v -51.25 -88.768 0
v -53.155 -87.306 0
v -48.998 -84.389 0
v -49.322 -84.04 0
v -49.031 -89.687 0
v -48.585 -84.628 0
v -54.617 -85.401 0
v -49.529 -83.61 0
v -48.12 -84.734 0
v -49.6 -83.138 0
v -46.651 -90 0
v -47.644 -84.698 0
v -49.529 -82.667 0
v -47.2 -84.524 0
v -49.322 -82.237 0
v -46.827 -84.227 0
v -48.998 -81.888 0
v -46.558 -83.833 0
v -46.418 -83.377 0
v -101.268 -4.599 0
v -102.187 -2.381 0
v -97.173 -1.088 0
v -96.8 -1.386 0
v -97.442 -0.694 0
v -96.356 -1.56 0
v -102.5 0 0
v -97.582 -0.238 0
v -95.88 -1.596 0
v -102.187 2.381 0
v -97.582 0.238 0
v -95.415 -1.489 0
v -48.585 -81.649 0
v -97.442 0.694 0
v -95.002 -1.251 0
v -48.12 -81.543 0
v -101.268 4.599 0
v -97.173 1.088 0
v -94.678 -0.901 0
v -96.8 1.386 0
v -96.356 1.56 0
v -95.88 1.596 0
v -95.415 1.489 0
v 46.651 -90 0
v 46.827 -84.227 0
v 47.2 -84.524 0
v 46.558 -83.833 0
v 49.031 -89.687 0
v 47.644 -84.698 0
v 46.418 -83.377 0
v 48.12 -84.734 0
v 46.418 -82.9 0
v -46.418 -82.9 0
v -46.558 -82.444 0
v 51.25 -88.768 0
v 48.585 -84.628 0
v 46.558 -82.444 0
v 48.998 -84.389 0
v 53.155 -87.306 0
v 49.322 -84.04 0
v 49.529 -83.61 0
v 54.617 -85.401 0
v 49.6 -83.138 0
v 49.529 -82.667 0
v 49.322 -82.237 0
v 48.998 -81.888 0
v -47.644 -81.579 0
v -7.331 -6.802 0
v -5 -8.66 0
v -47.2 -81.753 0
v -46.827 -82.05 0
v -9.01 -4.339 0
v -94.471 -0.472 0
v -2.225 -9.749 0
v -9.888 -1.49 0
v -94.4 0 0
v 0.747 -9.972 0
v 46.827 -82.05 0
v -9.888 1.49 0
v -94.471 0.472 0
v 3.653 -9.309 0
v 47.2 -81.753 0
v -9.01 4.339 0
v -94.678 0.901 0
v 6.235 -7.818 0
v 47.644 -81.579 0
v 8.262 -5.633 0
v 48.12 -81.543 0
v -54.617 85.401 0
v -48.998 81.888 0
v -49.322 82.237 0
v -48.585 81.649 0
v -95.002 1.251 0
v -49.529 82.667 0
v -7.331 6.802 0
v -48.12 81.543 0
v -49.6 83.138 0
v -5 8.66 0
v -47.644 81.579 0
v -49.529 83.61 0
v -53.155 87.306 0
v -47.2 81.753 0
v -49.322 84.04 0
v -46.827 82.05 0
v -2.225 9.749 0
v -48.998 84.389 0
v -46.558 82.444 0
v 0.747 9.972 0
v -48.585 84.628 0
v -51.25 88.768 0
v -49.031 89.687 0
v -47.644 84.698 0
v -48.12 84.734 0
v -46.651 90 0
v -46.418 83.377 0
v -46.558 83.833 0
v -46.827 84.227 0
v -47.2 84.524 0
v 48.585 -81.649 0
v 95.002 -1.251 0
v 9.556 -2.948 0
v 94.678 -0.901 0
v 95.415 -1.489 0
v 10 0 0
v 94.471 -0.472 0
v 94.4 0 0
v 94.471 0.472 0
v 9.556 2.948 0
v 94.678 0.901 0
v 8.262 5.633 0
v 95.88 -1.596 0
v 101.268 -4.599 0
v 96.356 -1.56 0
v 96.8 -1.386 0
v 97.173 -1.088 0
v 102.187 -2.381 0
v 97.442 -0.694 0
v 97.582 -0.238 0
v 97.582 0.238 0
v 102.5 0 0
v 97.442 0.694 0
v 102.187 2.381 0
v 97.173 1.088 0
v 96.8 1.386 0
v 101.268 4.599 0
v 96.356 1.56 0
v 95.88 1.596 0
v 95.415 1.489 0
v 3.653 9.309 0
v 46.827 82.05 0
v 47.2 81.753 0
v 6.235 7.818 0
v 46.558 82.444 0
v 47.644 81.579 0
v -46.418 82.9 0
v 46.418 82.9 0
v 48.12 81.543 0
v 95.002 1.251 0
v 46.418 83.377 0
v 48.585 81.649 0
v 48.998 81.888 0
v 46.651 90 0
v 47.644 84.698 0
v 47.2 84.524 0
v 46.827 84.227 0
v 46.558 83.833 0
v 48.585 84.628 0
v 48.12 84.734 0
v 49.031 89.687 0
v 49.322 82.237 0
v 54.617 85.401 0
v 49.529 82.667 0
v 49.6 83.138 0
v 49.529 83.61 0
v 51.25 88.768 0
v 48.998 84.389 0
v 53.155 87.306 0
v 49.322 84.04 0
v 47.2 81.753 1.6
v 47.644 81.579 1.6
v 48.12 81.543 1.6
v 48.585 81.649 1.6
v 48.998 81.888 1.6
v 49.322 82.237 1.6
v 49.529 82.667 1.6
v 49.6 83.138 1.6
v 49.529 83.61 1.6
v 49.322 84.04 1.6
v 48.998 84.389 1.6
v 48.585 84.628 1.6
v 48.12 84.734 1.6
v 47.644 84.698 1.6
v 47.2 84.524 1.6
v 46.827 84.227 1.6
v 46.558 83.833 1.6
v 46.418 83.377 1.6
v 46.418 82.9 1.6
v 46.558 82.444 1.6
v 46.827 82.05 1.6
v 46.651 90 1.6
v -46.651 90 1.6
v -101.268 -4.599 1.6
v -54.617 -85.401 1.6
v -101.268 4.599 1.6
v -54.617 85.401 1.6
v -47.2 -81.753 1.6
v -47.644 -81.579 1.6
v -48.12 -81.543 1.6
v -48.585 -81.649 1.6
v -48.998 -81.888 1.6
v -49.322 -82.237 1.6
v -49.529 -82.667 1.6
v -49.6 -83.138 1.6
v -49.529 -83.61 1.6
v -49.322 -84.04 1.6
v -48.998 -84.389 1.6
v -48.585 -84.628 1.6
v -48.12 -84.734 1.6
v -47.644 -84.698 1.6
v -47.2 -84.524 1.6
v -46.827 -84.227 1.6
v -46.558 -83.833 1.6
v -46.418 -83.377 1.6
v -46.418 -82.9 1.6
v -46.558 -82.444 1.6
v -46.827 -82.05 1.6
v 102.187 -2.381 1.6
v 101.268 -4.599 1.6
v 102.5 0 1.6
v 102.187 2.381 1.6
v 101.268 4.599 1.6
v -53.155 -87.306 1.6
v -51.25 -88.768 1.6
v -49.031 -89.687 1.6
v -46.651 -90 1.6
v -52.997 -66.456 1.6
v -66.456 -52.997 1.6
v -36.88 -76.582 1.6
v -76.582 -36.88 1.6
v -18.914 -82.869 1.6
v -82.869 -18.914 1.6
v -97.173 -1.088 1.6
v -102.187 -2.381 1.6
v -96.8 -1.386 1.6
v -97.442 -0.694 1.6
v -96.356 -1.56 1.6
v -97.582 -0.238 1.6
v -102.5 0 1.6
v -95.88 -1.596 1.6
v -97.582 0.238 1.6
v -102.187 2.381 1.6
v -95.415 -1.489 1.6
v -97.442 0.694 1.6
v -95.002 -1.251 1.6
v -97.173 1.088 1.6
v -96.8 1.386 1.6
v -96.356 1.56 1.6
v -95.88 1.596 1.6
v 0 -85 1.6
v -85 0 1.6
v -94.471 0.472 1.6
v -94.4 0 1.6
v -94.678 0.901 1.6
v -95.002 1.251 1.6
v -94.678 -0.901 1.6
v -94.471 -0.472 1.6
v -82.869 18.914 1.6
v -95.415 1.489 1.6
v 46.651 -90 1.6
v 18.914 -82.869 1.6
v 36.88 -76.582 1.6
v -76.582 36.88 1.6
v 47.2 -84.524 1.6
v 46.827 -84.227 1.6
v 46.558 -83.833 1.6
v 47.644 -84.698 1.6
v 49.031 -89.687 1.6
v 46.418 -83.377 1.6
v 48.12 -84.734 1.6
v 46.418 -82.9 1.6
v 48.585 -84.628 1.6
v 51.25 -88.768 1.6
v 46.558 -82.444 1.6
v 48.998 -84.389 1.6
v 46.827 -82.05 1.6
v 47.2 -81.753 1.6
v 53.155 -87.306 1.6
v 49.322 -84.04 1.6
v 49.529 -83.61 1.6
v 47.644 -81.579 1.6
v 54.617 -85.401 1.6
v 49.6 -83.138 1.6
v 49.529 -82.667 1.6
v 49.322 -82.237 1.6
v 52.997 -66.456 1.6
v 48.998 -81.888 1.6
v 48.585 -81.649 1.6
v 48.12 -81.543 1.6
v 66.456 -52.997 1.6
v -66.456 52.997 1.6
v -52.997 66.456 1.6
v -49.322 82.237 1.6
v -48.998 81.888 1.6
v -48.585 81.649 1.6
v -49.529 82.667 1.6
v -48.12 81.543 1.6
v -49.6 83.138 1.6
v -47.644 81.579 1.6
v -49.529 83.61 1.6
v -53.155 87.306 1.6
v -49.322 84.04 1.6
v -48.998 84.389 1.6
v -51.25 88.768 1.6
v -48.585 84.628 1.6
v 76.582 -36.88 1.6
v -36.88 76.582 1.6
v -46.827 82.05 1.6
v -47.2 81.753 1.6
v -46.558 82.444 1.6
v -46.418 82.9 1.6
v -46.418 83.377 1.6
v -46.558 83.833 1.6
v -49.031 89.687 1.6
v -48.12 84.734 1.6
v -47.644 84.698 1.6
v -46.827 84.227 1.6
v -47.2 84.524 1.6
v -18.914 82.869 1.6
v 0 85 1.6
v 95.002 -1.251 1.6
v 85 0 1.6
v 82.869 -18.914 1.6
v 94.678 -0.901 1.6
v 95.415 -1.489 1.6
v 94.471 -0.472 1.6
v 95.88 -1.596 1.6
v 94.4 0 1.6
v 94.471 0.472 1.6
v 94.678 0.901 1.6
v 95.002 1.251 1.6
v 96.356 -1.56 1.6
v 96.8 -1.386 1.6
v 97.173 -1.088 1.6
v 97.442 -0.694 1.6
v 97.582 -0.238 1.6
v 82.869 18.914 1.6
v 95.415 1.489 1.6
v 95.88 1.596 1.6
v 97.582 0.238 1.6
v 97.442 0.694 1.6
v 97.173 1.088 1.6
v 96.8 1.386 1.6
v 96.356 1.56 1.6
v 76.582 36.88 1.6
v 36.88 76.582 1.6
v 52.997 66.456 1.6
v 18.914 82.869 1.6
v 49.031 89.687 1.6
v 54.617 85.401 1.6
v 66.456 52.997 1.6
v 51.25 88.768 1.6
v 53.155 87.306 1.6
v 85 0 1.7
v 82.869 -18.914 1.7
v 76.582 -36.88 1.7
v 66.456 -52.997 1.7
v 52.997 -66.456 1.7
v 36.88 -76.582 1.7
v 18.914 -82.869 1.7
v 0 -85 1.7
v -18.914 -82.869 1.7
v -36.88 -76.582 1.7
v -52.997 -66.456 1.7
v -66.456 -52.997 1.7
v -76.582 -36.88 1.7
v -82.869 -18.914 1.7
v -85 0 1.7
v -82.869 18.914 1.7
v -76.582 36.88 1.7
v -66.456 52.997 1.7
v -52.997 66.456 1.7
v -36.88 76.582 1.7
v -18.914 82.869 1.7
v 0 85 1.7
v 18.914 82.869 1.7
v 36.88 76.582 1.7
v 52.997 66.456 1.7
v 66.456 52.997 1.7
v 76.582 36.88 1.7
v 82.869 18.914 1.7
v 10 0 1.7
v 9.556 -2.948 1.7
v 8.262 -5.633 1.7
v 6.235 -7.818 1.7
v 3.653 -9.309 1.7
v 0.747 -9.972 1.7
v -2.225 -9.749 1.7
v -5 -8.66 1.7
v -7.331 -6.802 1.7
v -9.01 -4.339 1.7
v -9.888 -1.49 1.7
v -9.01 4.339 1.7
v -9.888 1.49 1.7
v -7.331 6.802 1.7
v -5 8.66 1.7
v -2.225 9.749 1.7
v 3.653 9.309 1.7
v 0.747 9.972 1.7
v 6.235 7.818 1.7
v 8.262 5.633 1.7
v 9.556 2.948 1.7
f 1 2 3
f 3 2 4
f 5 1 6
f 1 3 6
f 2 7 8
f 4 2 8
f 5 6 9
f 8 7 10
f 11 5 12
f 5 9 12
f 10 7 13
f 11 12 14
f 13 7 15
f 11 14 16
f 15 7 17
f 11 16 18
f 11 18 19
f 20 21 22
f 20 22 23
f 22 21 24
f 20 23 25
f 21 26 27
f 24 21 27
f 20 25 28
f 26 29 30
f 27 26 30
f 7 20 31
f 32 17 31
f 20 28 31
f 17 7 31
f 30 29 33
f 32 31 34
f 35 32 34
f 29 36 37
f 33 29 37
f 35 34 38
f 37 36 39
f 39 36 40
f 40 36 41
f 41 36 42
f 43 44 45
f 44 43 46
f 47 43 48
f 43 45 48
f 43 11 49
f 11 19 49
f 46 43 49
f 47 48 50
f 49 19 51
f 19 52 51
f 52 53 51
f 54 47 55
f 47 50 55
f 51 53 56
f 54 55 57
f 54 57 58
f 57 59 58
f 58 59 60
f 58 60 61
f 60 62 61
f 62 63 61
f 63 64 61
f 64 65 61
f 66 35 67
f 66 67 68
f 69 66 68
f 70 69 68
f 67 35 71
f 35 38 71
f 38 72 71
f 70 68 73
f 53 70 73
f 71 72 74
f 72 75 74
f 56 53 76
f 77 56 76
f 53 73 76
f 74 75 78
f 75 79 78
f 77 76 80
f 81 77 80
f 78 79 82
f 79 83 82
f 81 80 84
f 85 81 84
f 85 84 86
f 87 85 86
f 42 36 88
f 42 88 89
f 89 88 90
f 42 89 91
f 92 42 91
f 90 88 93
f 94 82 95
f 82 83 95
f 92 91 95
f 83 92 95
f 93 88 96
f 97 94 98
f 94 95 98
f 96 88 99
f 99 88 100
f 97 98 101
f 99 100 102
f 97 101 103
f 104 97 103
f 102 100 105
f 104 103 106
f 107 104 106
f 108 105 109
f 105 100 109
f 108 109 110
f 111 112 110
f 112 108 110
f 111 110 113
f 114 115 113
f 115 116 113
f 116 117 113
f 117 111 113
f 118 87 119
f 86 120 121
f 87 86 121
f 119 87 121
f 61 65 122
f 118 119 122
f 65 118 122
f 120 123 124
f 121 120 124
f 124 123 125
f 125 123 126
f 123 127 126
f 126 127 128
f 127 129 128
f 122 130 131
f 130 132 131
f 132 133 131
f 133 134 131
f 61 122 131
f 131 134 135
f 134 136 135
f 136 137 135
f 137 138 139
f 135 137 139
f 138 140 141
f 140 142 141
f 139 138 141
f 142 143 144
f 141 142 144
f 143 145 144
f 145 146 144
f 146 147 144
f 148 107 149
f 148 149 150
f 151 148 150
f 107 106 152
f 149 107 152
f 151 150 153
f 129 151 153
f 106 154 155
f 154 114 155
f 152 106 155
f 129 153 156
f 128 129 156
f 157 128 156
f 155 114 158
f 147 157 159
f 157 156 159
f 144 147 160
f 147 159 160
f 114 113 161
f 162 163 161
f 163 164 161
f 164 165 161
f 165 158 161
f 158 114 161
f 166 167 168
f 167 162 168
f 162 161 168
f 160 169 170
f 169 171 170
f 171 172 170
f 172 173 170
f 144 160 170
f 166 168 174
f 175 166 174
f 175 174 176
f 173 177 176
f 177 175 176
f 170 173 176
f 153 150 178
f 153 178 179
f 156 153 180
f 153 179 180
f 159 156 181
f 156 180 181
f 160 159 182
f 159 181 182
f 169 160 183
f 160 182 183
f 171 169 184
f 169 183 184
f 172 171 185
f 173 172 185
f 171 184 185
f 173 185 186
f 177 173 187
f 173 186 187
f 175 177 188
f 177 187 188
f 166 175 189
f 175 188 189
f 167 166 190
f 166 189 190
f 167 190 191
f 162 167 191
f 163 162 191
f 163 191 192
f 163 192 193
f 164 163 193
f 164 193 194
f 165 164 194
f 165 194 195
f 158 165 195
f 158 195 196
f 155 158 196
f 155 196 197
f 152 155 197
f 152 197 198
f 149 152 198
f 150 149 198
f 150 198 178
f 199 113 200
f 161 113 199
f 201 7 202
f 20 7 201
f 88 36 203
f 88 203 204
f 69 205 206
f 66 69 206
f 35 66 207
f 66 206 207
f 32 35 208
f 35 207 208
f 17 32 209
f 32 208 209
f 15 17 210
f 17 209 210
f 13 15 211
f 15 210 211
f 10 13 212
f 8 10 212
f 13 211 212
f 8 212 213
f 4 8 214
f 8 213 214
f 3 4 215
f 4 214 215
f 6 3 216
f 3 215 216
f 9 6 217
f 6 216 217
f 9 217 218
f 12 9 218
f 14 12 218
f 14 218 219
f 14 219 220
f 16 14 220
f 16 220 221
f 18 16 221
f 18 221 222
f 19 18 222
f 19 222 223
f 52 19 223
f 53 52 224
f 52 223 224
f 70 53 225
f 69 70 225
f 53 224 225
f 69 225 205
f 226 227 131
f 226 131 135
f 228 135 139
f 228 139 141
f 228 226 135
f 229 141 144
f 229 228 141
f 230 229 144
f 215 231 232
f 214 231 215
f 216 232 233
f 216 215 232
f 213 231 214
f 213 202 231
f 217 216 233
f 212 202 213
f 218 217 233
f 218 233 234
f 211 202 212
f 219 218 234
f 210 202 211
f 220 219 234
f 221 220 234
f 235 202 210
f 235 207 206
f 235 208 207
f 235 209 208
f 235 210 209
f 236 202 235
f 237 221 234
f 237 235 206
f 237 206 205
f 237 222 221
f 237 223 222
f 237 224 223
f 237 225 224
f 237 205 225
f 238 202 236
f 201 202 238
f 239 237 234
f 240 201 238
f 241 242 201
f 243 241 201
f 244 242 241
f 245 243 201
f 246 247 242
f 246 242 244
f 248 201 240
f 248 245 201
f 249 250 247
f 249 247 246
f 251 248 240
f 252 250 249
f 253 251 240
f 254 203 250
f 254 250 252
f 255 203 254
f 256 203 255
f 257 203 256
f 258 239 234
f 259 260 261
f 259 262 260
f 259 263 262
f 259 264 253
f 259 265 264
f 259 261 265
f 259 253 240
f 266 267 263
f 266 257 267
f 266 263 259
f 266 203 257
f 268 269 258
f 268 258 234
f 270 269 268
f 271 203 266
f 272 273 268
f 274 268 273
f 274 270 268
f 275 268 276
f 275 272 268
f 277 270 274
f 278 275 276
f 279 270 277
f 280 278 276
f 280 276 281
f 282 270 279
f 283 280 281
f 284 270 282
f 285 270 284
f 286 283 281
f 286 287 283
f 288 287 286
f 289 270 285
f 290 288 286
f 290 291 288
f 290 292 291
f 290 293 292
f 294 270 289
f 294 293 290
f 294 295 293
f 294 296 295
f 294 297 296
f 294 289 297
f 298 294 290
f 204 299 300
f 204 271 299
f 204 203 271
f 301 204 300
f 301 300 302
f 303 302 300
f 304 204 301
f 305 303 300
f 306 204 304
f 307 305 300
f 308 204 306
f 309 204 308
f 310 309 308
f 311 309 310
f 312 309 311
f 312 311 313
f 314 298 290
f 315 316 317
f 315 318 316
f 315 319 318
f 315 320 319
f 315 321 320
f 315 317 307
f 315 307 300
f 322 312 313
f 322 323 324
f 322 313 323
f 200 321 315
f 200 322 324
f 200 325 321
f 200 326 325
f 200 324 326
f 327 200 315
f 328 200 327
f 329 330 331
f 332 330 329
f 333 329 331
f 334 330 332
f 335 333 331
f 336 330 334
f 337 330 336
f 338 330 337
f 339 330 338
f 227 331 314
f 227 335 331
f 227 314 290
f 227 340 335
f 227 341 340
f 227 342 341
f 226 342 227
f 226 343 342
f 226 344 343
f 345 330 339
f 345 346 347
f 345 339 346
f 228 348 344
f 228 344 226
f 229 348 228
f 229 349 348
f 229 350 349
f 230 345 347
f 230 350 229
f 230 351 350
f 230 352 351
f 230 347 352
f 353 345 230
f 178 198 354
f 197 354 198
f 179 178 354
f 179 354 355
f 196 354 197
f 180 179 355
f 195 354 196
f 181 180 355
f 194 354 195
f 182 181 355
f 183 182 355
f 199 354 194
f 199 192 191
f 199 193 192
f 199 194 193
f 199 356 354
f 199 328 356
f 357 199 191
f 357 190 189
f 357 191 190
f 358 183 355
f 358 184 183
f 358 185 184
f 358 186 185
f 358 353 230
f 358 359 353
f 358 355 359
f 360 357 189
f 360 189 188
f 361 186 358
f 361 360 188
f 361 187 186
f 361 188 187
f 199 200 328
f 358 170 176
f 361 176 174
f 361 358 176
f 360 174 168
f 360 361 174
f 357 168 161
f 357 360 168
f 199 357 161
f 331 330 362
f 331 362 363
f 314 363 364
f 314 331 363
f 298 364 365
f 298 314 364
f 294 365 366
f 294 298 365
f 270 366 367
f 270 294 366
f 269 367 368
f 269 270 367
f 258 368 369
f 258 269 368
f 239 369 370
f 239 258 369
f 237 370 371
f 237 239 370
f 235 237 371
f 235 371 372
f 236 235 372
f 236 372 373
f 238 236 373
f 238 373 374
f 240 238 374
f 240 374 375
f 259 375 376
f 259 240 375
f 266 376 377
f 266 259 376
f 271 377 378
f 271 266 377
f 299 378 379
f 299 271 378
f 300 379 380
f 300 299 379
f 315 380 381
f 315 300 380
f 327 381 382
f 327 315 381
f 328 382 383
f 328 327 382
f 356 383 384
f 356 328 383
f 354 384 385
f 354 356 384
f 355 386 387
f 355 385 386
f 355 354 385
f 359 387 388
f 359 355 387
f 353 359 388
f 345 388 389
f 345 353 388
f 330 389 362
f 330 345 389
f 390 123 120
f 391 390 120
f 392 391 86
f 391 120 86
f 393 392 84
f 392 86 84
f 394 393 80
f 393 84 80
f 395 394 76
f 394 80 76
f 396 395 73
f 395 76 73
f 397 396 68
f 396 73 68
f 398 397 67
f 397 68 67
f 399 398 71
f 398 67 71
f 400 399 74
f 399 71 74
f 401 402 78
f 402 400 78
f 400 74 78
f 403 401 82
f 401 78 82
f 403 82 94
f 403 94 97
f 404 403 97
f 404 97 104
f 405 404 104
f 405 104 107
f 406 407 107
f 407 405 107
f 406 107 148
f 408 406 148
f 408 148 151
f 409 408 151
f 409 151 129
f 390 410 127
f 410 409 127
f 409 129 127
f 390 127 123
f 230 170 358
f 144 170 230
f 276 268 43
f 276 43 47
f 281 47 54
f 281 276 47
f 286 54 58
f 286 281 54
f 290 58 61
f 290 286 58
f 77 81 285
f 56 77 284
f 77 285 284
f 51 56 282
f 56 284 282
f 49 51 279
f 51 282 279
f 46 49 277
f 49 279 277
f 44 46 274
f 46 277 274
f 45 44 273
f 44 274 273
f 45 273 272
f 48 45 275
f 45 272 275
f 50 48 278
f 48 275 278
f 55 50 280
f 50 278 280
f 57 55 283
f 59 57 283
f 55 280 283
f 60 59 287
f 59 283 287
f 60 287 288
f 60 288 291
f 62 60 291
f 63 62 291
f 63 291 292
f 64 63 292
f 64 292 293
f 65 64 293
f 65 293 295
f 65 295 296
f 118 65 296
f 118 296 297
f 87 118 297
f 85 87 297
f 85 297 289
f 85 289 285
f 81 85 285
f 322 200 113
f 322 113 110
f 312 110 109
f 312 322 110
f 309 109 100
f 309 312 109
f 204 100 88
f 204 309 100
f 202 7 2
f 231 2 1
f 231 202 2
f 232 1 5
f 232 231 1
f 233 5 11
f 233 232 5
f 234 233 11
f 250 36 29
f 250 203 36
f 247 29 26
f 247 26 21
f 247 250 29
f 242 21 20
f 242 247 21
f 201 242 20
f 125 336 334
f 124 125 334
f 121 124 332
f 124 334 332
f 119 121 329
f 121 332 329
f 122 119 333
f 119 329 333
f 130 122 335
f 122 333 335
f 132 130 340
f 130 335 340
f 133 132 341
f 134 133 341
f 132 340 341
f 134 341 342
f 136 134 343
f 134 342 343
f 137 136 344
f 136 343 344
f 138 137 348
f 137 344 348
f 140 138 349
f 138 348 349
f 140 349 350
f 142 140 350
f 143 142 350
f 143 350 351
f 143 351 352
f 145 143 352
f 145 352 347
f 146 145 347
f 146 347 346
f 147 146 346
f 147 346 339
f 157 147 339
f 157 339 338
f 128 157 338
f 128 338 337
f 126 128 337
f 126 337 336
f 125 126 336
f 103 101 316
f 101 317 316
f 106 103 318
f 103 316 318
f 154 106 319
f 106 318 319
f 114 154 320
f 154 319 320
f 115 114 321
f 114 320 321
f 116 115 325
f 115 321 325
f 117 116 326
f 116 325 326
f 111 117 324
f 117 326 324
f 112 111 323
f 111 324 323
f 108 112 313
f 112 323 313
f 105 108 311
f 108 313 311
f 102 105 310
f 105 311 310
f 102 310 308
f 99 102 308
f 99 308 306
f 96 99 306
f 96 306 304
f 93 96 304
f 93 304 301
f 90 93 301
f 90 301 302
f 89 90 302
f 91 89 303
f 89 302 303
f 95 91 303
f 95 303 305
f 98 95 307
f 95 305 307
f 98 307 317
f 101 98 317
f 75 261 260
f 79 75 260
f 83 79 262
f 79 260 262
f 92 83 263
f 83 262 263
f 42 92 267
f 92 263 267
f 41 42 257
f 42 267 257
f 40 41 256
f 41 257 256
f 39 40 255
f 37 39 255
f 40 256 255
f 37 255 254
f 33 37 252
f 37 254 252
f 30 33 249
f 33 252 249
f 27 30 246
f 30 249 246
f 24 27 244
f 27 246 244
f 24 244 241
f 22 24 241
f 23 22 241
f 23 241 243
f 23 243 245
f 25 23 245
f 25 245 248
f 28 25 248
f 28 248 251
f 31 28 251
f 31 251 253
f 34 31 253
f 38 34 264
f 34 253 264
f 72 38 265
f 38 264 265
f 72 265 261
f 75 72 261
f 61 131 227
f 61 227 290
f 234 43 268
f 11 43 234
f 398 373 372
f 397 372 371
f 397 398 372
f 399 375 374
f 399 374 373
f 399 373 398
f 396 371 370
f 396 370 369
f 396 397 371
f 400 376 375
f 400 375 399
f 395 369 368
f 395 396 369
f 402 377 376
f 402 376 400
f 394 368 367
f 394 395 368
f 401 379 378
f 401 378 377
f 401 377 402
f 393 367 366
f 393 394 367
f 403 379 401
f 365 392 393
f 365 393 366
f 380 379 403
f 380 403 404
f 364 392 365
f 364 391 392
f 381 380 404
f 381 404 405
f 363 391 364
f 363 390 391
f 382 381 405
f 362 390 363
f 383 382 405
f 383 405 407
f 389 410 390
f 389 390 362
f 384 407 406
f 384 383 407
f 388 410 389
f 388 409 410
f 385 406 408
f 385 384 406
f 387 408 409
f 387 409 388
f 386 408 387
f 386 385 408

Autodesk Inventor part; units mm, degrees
ref_plane "YZ Plane" through (0, 0, 0) normal (1, 0, 0) x (0, 1, 0)
ref_plane "XZ Plane" through (0, 0, 0) normal (0, 1, 0) x (-1, 0, 0)
ref_plane "XY Plane" through (0, 0, 0) normal (0, 0, 1) x (1, 0, 0)
sketch "Sketch1" plane through (0, 0, 0) normal (0, 0, 1) x (1, 0, 0)
  line L0 (51.9615, 90) -> (103.923, 0)
  line L1 (103.923, 0) -> (51.9615, -90)
  line L2 (51.9615, -90) -> (-51.9615, -90)
  line L3 (-51.9615, -90) -> (-103.923, 0)
  line L4 (-103.923, 0) -> (-51.9615, 90)
  line L5 (-51.9615, 90) -> (51.9615, 90)
  circle A0 centre (0, 0) radius 85
  circle A1 centre (0, 0) radius 10
  dimension "d1" = 170
  dimension "d2" = 180
  dimension "d12" = 20
extrude "Extrusion1" add sketch "Sketch1" along normal blind 1.6 contours L0 L1 L2 L3 L4 L5 | A0
sketch "Sketch3" plane through (0, 0, 1.6) normal (0, 0, 1) x (1, 0, 0)
  circle A0 centre (0, 0) radius 10 projected
  circle A1 centre (-96, 0) radius 1.6
  line L0 (-51.9615, 90) -> (-103.923, 0) projected
  line L1 (-103.923, 0) -> (-51.9615, -90) projected
  arc A2 (-101.2676, 4.5994) -> (-101.2676, -4.5994) centre (-93.3013, 0) ccw
  dimension "d13" = 96
  dimension "d14" = 3.2
  dimension "d20" = 9.1987
  dimension "d21" = 93.3013
extrude "Extrusion3" cut sketch "Sketch3" against normal up to next contours A1 | A2 L1 L0
pattern_circular "Circular Pattern1" count 6 over 360 about axis through (0, 0, 0) along (0, 0, 1) of "Extrusion3"
sketch "Sketch4" plane through (0, 0, 1.6) normal (0, 0, 1) x (1, 0, 0)
  circle A0 centre (0, 0) radius 10 projected
  circle A1 centre (0, 0) radius 85
  dimension "d22" = 170
extrude "Extrusion4" add sketch "Sketch4" along normal blind 0.1
properties part number "Heatbed_170mm_Hex"
